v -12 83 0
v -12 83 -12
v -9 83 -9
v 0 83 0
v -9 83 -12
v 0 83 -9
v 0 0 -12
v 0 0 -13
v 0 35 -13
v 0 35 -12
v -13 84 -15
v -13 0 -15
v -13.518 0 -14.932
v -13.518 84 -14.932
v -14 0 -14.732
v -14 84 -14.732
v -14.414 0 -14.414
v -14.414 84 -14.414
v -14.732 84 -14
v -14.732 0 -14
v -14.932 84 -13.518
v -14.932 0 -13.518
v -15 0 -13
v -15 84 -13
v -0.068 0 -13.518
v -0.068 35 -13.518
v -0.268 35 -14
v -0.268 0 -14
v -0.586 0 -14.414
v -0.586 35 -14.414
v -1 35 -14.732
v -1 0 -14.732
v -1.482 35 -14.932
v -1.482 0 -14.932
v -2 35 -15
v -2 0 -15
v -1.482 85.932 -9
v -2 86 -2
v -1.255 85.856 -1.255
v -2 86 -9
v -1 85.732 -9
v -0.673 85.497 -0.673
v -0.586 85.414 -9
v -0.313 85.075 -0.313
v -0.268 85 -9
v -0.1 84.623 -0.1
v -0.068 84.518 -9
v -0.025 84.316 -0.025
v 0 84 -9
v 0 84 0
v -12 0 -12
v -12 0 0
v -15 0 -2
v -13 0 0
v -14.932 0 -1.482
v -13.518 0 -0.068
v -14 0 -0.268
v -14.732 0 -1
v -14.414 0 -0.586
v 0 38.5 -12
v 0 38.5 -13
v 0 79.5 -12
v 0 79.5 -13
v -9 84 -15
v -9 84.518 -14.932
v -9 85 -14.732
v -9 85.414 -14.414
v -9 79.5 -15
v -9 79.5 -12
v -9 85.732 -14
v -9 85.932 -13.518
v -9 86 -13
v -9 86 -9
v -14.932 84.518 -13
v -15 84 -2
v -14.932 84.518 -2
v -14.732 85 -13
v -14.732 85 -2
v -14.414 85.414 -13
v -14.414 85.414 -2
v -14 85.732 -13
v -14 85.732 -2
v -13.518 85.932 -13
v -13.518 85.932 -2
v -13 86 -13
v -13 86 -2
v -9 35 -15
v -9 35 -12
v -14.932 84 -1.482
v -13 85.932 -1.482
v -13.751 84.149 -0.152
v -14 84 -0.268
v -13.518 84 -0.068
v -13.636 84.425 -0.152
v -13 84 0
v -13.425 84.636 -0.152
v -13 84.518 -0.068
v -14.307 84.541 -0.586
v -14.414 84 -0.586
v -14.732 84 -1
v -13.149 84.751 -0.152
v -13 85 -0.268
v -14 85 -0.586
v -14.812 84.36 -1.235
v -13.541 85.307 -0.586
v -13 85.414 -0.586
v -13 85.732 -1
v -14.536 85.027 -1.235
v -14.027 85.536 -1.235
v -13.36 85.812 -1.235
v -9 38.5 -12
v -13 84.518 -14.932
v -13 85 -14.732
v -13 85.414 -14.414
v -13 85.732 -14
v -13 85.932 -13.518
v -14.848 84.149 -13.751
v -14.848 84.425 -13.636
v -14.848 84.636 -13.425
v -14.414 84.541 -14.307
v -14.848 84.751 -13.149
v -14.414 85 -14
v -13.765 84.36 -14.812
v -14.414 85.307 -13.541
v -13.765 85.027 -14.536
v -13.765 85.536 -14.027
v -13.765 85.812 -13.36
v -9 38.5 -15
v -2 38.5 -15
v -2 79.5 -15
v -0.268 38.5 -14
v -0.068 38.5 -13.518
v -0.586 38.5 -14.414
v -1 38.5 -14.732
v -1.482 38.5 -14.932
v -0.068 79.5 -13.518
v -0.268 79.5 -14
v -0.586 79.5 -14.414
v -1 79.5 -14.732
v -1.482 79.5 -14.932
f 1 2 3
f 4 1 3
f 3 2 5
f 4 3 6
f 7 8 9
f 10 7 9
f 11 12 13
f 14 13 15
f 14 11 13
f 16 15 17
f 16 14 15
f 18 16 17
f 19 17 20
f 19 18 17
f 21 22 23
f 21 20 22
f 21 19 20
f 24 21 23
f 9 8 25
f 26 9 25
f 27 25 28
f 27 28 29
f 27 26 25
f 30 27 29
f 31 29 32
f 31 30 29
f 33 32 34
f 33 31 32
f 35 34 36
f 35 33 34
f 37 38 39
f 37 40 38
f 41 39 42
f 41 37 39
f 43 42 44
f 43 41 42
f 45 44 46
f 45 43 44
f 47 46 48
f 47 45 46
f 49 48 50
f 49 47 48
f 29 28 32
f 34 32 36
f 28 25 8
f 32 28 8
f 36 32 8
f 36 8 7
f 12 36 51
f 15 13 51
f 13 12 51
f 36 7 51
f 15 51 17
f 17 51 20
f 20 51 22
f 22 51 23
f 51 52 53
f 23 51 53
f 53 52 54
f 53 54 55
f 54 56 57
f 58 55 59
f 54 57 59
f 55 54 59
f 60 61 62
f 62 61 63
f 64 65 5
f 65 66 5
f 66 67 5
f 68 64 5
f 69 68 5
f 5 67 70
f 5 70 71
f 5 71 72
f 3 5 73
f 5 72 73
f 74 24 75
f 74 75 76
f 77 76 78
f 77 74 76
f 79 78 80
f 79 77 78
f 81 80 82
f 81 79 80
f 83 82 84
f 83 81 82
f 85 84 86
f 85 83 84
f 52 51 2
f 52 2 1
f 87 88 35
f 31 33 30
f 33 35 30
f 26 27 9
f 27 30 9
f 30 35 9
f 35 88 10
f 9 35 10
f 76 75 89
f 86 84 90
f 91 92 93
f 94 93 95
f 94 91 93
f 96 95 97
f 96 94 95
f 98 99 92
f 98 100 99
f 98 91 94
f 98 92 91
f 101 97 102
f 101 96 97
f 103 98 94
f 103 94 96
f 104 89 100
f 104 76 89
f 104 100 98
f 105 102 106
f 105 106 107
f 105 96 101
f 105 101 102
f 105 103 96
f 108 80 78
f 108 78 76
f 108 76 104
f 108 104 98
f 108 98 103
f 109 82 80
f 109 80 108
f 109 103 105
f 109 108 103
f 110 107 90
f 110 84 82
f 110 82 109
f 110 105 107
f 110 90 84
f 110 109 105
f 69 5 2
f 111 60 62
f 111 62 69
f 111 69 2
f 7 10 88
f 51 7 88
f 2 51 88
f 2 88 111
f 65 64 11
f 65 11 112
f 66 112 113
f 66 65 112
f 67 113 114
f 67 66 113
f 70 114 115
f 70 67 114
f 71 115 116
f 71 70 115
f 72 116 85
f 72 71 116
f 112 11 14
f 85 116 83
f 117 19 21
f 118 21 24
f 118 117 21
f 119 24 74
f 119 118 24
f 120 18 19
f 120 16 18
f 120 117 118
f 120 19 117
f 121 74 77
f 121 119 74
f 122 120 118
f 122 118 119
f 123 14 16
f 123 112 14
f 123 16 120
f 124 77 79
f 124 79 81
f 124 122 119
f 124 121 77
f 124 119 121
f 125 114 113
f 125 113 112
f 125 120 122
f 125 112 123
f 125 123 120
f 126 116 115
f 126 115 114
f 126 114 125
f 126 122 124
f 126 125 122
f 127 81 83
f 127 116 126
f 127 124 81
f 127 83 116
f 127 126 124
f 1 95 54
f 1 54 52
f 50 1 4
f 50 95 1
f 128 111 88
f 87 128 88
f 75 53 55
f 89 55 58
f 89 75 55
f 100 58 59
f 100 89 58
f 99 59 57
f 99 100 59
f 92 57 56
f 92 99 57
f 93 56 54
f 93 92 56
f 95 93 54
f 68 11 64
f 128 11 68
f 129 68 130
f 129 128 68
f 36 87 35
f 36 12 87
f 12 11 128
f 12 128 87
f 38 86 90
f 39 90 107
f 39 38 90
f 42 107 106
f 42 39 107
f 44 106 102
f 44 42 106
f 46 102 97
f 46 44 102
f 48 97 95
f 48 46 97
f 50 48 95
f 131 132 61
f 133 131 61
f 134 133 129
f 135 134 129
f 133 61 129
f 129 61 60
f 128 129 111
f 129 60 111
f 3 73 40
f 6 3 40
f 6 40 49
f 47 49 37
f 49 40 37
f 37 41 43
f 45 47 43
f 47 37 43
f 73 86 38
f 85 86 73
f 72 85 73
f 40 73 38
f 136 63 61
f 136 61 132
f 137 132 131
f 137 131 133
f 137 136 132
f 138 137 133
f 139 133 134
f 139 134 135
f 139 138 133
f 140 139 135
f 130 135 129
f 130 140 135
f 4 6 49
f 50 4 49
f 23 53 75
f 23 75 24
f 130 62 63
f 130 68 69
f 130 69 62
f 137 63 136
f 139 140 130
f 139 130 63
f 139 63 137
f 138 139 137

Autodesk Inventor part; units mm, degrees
ref_plane "YZ Plane" through (0, 0, 0) normal (1, 0, 0) x (0, 1, 0)
ref_plane "XZ Plane" through (0, 0, 0) normal (0, 1, 0) x (-1, 0, 0)
ref_plane "XY Plane" through (0, 0, 0) normal (0, 0, 1) x (1, 0, 0)
sketch "Sketch1" plane through (0, 0, 0) normal (0, 1, 0) x (-1, 0, 0)
  line L0 (15, 0) -> (15, -15)
  line L1 (15, -15) -> (0, -15)
  line L2 (0, -15) -> (0, -12)
  line L3 (0, -12) -> (12, -12)
  line L4 (12, -12) -> (12, 0)
  line L5 (12, 0) -> (15, 0)
  point P0 (0, 0)
  dimension "d0" = 15
  dimension "d1" = 15
  dimension "d10" = 3
  dimension "d11" = 12
  dimension "d12" = 12
extrude "Extrusion1" add sketch "Sketch1" along normal blind 86
sketch "Sketch4" plane through (-12, 0, 0) normal (1, 0, 0) x (0, 0, -1)
  line L0 (0, 0) -> (0, 86) projected
  line L1 (12, 0) -> (12, 86) projected
  line L2 (0, 86) -> (12, 86)
  line L3 (12, 86) -> (12, 83)
  line L4 (12, 83) -> (0, 83)
  line L5 (0, 83) -> (0, 86)
  dimension "d13" = 3
extrude "Extrusion3" add sketch "Sketch4" along normal blind 3
sketch "Sketch6" plane through (-12, 0, -12) normal (0, 0, 1) x (1, 0, 0)
  line L0 (3, 86) -> (12, 86) projected
  line L1 (12, 86) -> (3, 86)
  line L2 (3, 86) -> (3, 83)
  line L3 (3, 83) -> (12, 83)
  line L4 (12, 83) -> (12, 86)
  point P0 (12, 0)
extrude "Extrusion4" add sketch "Sketch6" along normal blind 12
fillet "Fillet3" radius 2 7 edges at (-7.5, 86, -15) (-15, 86, -7.5) (-15, 43, -15) (0, 43, -15) (-7.5, 86, 0) (0, 86, -7.5) (-15, 43, 0)
sketch "Sketch11" plane through (0, 86, 0) normal (0, 1, 0) x (1, 0, 0)
  arc A0 (-15, 2) -> (-13, 0) centre (-13, 2) ccw projected
  line L0 (0, 10.8348) -> (0, 14)
  line L1 (-9, 9) -> (0, 9)
  line L2 (0, 9) -> (0, 10.8348)
  line L3 (-9, 15) -> (0, 15)
  line L4 (0, 15) -> (0, 9)
  line L5 (-9, 15) -> (-9, 9)
  line L6 (0, 0) -> (0, 13) projected
  point P0 (-13, 0)
  point P1 (0, 15)
extrude "Extrusion7" cut sketch "Sketch11" against normal blind 6.5
sketch "Sketch12" plane through (-12, 0, -12) normal (0, 0, 1) x (1, 0, 0)
  line L0 (12, 33) -> (21, 33) construction
  line L1 (12, 0) -> (12, 79.5) projected
  line L2 (3, 36) -> (3, 35.5)
  line L3 (12, 38.5) -> (3, 38.5)
  line L4 (3, 38.5) -> (3, 35)
  line L5 (3, 35) -> (12, 35)
  dimension "d44" = 3.5
  dimension "d45" = 9
extrude "Extrusion8" cut sketch "Sketch12" against normal through all
properties part number "DoosjeHoeken" material "ABS Plastic"
